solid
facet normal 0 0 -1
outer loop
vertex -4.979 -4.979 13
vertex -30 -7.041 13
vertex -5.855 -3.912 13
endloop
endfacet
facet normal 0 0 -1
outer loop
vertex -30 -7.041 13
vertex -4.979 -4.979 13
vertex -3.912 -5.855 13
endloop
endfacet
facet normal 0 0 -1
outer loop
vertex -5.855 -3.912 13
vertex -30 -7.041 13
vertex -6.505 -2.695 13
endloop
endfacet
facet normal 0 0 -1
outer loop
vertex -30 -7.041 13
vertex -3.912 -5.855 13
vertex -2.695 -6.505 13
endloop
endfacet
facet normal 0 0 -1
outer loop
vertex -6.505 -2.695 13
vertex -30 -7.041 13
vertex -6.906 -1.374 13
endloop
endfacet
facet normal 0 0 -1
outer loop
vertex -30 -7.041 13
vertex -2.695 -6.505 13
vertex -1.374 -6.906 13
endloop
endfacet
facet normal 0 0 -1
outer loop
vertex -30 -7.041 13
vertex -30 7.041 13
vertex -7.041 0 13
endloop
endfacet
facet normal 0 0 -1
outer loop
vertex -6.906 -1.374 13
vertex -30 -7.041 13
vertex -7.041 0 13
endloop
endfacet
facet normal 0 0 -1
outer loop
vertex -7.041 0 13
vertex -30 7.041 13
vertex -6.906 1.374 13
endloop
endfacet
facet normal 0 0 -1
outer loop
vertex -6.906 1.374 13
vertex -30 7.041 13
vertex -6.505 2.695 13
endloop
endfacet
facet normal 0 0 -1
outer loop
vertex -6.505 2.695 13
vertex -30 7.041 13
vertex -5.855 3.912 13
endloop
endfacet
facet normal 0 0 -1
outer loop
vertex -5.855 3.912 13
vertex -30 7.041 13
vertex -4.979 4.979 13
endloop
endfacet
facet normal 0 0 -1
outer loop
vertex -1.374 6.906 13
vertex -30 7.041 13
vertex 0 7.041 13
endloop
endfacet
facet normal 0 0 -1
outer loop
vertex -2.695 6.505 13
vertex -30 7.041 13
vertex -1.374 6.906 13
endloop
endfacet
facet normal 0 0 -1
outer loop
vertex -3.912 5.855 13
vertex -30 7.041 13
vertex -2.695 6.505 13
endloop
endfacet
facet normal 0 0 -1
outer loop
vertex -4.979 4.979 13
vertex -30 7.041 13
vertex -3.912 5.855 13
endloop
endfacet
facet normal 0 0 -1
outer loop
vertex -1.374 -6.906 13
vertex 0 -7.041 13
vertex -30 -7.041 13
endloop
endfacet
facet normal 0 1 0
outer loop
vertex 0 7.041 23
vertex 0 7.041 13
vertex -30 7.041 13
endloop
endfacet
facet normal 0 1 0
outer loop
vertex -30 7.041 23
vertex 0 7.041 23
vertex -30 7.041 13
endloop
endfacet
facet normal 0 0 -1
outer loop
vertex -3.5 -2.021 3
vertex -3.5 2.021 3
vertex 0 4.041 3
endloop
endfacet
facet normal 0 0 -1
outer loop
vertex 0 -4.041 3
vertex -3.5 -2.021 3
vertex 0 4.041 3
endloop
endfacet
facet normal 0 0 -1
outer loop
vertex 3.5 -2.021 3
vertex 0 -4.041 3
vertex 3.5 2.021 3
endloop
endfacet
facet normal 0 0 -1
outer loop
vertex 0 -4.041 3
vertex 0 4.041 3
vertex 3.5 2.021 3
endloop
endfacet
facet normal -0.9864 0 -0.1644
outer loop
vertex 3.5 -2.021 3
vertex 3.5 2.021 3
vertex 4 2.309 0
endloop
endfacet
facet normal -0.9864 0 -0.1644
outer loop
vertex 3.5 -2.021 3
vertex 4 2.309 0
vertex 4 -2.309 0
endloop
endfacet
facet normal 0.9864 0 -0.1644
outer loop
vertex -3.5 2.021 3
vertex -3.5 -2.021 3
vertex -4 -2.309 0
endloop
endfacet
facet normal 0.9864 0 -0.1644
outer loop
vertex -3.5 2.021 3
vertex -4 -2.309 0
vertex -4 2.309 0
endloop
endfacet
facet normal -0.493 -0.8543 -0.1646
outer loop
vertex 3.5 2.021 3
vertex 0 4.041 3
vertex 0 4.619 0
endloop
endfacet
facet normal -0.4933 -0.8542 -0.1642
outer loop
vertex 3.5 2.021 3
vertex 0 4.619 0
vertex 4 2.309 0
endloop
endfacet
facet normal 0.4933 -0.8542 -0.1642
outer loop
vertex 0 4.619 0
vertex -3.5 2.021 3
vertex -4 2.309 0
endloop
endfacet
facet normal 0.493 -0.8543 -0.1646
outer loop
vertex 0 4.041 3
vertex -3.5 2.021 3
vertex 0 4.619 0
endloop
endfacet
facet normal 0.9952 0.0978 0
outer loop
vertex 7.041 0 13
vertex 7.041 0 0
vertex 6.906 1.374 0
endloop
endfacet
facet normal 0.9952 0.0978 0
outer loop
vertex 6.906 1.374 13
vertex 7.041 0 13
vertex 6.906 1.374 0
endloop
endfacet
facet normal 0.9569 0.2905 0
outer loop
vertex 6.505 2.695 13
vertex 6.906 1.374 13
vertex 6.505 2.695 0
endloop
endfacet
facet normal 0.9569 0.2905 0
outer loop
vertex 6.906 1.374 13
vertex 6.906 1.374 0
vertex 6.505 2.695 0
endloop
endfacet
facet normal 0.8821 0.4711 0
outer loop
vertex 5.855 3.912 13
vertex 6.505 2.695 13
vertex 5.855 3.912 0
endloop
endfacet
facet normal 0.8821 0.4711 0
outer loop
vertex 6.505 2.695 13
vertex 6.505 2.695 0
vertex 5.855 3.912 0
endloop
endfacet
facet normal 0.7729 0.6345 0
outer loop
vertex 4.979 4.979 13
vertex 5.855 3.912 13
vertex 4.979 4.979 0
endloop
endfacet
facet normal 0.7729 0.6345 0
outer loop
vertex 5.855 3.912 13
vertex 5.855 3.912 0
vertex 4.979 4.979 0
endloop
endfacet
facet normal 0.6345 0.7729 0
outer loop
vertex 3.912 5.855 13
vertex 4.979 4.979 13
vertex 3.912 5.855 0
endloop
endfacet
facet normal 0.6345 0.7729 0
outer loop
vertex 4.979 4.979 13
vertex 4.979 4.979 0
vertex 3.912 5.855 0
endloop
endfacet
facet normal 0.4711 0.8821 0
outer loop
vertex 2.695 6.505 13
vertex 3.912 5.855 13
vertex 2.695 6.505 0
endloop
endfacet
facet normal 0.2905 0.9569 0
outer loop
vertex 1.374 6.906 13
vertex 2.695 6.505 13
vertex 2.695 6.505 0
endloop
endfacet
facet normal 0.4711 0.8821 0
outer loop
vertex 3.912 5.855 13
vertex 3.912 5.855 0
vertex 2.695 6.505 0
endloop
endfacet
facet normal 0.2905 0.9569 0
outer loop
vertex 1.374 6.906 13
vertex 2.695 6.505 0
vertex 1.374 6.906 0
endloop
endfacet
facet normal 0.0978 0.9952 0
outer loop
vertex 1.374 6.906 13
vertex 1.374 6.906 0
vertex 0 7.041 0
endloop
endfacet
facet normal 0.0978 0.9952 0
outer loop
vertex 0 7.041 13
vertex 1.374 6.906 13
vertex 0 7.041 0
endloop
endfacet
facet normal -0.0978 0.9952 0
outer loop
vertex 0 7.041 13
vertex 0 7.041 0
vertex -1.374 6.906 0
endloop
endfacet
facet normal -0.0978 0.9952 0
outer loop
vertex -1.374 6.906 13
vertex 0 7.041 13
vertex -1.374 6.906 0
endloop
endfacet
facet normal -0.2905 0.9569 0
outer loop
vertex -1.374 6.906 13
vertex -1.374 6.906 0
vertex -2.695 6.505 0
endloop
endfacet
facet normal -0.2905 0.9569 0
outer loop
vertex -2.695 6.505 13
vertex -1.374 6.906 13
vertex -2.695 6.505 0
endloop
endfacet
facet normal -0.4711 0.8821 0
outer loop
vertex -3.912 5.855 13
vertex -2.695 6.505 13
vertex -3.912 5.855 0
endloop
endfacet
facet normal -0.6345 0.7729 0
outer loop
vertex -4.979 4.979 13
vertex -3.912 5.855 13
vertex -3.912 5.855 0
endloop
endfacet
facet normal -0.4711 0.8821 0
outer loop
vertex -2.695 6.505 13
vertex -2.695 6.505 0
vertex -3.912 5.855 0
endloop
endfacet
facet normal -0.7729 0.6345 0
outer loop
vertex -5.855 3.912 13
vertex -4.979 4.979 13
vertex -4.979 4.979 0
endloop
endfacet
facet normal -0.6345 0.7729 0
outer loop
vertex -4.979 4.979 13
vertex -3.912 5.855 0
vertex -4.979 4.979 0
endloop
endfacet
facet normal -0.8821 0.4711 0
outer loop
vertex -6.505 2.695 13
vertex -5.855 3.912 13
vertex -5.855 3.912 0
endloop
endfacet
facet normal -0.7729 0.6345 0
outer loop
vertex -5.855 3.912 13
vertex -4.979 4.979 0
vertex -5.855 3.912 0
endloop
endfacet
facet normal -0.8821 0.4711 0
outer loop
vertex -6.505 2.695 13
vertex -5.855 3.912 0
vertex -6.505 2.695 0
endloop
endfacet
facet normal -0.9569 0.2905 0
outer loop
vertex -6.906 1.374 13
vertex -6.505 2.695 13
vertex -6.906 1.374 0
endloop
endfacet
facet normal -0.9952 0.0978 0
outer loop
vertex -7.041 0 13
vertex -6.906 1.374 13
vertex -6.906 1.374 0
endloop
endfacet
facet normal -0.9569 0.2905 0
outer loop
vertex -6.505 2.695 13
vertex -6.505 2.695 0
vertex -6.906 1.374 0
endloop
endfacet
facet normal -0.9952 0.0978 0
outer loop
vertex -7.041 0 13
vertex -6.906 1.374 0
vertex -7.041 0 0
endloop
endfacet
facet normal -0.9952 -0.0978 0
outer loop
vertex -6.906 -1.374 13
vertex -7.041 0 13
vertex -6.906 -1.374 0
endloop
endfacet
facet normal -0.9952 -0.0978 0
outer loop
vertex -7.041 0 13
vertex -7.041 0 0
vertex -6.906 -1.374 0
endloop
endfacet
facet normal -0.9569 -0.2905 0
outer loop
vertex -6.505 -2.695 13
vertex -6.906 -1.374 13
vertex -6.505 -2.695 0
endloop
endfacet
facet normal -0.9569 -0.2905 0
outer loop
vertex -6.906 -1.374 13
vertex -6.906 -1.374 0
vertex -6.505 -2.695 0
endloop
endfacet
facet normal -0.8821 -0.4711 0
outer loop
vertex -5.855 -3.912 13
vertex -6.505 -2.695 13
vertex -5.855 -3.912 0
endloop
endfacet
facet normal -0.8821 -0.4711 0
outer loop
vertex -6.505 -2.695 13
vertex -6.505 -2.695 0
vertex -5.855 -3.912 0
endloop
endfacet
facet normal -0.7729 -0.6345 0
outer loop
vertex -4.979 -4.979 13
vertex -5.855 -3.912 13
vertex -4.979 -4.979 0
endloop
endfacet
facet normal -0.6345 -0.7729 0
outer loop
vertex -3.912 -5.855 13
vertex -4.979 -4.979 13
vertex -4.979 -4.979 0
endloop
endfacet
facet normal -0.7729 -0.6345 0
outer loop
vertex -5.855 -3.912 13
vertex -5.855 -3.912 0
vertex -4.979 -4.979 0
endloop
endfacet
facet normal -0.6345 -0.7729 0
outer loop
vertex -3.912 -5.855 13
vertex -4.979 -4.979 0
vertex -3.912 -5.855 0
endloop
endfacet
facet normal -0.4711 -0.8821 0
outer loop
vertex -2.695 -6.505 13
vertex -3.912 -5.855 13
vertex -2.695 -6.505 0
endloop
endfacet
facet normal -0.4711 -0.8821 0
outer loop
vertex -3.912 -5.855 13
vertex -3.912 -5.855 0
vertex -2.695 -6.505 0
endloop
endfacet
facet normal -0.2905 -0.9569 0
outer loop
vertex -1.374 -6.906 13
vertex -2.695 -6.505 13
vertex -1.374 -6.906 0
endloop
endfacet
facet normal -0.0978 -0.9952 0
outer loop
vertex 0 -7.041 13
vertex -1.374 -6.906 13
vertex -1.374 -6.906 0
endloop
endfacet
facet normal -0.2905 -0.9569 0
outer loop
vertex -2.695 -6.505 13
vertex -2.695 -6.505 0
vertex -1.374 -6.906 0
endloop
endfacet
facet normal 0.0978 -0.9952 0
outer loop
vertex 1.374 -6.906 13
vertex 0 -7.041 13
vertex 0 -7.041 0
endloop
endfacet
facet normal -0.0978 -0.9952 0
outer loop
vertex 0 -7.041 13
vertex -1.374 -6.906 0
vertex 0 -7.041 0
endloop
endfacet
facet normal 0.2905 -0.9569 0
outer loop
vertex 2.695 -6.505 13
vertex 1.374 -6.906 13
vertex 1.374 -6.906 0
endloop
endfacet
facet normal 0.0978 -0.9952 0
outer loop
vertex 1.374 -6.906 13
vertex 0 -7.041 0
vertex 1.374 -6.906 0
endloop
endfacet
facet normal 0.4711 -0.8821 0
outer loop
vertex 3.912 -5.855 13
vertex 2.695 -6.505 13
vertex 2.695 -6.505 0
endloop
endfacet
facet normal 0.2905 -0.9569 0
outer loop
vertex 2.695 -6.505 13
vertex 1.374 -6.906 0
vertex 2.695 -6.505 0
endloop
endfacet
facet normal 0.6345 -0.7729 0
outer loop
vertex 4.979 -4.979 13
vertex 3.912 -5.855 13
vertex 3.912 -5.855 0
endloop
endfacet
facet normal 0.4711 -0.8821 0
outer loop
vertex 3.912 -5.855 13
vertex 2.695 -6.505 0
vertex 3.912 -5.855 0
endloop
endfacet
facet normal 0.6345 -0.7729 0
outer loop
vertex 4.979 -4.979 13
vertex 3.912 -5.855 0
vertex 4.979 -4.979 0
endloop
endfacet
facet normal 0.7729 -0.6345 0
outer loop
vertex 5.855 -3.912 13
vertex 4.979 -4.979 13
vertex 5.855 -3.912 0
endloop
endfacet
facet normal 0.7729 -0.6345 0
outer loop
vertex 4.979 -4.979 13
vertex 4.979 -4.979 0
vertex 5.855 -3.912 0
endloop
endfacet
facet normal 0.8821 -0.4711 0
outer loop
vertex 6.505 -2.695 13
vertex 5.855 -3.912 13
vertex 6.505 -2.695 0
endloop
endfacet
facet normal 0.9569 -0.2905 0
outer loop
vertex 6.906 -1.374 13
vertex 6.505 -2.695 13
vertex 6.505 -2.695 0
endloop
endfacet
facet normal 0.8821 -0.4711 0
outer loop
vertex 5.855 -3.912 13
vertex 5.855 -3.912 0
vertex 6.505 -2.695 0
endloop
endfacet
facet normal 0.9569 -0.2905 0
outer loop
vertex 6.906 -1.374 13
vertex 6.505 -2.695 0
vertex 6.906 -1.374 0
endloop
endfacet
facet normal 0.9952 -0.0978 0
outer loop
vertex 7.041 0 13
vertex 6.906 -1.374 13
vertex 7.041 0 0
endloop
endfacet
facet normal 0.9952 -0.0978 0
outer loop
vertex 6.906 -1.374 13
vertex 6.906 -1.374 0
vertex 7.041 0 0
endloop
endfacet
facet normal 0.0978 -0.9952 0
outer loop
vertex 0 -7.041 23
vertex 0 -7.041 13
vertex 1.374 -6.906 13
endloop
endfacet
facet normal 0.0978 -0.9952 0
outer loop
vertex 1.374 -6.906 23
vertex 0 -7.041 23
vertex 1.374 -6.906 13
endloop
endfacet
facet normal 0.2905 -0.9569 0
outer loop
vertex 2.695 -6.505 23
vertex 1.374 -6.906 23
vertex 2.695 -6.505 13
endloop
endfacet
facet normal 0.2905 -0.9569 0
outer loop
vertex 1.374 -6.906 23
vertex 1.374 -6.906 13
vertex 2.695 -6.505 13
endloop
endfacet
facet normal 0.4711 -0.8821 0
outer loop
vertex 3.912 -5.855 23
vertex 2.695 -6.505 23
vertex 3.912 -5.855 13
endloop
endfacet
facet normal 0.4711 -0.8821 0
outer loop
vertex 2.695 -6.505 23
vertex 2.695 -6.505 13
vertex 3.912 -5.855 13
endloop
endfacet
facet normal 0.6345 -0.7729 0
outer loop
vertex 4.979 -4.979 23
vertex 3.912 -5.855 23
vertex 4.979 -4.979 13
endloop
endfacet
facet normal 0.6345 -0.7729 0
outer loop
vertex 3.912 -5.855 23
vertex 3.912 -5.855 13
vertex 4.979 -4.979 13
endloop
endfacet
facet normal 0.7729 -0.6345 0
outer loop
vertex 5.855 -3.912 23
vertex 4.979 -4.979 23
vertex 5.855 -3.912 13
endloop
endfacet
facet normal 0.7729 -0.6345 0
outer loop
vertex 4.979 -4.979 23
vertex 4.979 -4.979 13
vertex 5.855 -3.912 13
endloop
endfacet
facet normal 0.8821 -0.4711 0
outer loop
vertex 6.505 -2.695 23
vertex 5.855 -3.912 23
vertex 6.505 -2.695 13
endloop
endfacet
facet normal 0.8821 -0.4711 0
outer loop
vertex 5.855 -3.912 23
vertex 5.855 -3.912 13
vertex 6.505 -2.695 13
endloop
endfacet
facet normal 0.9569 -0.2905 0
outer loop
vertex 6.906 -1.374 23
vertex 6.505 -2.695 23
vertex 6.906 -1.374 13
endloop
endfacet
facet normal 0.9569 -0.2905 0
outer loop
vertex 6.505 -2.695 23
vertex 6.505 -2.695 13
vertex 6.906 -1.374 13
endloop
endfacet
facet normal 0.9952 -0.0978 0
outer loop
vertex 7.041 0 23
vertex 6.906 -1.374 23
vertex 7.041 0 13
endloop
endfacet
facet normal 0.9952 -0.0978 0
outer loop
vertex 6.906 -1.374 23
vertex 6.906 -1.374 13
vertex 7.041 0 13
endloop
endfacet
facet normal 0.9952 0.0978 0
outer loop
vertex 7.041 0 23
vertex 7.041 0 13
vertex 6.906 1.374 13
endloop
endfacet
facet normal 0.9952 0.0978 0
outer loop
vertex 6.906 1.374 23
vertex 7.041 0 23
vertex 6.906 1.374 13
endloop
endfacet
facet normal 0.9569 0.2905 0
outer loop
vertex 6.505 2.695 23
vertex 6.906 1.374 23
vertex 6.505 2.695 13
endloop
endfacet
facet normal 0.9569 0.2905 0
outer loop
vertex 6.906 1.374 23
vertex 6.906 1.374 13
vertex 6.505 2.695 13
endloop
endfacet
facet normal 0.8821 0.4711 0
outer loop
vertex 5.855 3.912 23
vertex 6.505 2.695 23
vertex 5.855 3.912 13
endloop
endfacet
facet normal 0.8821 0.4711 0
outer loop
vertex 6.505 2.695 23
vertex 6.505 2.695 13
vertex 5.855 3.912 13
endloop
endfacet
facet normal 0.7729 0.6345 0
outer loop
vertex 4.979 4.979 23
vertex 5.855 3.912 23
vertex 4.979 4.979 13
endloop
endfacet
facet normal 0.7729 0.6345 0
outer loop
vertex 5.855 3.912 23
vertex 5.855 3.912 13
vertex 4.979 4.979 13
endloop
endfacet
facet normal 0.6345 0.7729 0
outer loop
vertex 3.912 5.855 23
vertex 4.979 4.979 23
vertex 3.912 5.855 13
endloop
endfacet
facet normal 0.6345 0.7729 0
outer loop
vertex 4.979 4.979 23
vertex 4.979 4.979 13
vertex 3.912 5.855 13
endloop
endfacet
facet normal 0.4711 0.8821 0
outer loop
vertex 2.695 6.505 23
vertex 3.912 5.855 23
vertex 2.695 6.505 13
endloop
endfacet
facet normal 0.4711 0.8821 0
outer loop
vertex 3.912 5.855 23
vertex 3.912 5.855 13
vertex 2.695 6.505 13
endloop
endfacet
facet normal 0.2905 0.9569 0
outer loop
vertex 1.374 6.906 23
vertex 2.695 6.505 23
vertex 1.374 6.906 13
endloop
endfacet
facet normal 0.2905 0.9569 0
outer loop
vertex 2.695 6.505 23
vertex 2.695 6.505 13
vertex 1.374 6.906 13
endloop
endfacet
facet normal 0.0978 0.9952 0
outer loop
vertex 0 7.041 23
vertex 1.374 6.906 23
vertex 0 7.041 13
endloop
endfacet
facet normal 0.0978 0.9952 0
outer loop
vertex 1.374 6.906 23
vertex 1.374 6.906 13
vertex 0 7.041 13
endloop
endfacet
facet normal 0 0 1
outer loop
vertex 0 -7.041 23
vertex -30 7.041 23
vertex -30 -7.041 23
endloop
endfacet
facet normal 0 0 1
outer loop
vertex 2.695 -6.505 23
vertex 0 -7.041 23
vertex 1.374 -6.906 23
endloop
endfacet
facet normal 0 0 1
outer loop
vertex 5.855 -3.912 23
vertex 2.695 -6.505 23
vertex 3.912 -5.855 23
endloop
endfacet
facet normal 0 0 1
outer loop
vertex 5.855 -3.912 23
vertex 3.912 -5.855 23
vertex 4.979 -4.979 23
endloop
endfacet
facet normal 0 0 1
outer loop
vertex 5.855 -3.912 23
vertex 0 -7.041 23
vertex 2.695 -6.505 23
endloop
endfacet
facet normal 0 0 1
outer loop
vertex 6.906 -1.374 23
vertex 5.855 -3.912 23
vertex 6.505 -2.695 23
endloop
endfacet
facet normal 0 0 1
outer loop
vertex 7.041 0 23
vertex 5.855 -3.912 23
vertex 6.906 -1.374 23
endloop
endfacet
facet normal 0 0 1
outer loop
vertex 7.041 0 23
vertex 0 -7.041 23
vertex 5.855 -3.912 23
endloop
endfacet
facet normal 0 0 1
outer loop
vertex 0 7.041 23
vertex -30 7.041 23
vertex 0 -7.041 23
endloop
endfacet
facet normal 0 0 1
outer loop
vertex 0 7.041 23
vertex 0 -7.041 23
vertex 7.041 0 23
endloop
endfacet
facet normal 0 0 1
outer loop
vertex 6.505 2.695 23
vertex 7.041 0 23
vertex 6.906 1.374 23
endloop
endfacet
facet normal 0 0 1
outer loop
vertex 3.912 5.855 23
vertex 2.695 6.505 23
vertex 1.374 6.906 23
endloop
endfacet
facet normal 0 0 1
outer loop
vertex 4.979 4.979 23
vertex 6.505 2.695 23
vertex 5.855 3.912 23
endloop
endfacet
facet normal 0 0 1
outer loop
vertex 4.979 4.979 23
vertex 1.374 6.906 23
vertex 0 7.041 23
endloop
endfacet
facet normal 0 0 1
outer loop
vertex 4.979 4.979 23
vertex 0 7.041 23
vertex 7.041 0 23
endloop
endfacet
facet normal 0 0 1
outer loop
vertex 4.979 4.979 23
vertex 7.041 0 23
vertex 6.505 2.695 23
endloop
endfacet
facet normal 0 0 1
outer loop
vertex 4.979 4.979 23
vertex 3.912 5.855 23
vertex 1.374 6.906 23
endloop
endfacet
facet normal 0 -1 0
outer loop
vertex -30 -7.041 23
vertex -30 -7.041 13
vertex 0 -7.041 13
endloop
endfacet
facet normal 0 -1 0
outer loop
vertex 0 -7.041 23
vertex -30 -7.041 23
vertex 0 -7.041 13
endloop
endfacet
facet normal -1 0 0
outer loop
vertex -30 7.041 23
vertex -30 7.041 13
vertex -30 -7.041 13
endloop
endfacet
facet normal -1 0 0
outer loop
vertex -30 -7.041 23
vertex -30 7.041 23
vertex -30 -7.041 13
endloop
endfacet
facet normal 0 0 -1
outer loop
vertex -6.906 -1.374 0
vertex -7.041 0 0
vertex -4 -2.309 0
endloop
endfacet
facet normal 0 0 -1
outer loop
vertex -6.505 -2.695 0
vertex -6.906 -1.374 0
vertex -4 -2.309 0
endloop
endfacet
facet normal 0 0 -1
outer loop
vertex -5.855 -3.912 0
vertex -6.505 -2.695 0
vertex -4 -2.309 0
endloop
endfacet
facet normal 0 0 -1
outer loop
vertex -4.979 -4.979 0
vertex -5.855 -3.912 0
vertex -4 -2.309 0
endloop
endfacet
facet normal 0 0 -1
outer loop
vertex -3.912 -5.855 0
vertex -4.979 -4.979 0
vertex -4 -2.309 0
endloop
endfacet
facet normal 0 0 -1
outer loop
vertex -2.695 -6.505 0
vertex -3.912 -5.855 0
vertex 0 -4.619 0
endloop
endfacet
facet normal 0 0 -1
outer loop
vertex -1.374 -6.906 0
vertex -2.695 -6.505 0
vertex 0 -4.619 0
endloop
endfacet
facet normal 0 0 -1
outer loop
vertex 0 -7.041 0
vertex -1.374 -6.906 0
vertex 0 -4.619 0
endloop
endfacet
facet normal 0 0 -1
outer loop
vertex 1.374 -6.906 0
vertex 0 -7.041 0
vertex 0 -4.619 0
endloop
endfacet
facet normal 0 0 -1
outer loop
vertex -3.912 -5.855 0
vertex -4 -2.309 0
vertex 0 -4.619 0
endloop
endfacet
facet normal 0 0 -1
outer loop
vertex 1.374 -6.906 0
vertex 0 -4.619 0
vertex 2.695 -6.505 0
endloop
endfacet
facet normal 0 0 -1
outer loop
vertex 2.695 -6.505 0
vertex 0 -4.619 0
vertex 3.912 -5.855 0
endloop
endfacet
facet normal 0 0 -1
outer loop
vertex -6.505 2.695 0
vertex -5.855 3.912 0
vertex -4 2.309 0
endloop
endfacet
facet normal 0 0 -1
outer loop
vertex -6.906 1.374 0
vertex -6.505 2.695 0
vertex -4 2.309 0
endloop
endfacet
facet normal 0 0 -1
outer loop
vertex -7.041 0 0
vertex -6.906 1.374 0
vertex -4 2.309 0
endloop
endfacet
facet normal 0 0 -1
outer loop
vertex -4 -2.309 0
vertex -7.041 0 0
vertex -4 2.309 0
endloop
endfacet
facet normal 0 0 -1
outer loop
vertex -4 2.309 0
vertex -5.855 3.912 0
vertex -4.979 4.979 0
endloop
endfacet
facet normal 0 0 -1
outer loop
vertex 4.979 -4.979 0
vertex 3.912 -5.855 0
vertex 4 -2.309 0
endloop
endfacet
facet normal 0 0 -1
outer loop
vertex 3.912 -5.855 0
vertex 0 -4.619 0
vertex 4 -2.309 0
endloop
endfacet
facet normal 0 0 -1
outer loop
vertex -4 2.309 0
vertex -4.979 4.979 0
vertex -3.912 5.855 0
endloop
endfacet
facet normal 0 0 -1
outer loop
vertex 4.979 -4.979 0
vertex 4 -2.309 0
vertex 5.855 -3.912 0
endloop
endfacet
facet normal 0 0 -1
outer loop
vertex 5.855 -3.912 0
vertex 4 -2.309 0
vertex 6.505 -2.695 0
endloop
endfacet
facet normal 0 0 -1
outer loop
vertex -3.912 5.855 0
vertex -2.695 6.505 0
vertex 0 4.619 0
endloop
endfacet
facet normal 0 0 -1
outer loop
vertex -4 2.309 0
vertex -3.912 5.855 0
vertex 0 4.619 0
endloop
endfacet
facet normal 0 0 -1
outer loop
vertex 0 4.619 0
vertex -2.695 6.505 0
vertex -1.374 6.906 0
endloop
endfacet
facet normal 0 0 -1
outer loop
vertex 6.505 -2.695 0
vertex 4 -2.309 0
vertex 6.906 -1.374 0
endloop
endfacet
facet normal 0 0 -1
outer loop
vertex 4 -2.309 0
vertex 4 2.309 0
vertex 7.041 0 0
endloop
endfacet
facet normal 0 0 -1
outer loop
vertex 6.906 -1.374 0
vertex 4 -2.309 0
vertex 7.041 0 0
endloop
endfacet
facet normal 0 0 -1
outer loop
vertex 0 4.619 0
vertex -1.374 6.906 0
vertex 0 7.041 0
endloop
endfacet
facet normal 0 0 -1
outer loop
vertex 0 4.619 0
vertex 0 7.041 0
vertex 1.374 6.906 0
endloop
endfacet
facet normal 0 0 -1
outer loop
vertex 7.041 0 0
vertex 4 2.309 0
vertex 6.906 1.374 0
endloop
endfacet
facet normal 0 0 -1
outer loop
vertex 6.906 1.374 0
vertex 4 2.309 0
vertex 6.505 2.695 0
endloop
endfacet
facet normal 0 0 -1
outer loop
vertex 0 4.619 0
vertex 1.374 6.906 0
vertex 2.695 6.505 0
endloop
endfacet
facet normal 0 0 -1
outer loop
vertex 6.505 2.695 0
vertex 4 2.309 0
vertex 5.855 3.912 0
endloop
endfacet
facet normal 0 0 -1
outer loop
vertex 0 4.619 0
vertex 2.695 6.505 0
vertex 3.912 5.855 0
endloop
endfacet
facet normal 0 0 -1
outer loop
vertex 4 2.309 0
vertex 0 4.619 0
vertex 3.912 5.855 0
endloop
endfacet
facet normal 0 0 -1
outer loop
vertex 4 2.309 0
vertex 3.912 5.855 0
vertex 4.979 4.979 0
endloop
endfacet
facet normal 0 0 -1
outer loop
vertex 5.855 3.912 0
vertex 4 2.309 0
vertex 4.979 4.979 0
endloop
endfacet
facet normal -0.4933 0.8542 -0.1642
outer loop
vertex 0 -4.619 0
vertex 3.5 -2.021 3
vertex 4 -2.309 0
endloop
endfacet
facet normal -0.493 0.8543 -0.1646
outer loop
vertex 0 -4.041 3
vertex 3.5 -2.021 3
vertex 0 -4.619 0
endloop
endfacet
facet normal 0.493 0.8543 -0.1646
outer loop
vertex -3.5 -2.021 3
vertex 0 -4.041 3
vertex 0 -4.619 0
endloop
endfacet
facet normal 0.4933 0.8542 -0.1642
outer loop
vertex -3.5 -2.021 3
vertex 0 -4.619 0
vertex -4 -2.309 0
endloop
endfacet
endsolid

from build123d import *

# Parameters (mm, degrees)
F0_R     = 7.0414518843
F1_DEPTH = 3
F2_R     = 7.0414518843
F3_DEPTH = 10
F5_DEPTH = 10
F6_SIZE2 = 2.99999
F6_SIZE  = 0.49999


# Not quite as in the source:
# - a fillet or chamfer is up to 0.001 mm smaller than in the source, because OpenCascade refuses the exact size


with BuildPart() as f1:
    # F0 (on Top) → F1 (new body)
    with BuildSketch(Plane.XY):
        Circle(F0_R)
        Polygon((0, -4.0414518843), (-3.5, -2.0207259422), (-3.5, 2.0207259422), (0, 4.0414518843), (3.5, 2.0207259422), (3.5, -2.0207259422), align=None, mode=Mode.SUBTRACT)
    extrude(amount=F1_DEPTH)

    # F2 (on face) → F3 (join)
    with BuildSketch(Plane.XY.offset(3)):
        Circle(F2_R)
        Polygon((3.5, -2.0207259422), (0, -4.0414518843), (-3.5, -2.0207259422), (-3.5, 2.0207259422), (0, 4.0414518843), (3.5, 2.0207259422), align=None, mode=Mode.SUBTRACT)
        Polygon((-3.5, -2.0207259422), (0, -4.0414518843), (3.5, -2.0207259422), (3.5, 2.0207259422), (0, 4.0414518843), (-3.5, 2.0207259422), align=None)
    extrude(amount=F3_DEPTH)

    # F4 (on face) → F5 (join)
    with BuildSketch(Plane.XY.offset(13)):
        with BuildLine():
            ThreePointArc((7.0414518843, 0), (4.9790583768, 4.9790583768), (0, 7.0414518843))
            ThreePointArc((0, 7.0414518843), (-7.0414518843, 0), (0, -7.0414518843))
            ThreePointArc((0, -7.0414518843), (4.9790583768, -4.9790583768), (7.0414518843, 0))
        make_face()
        with BuildLine():
            ThreePointArc((0, -7.0414518843), (-7.0414518843, 0), (0, 7.0414518843))
            Line((0, 7.0414518843), (-30, 7.0414518843))
            Line((-30, 7.0414518843), (-30, -7.0414518843))
            Line((-30, -7.0414518843), (0, -7.0414518843))
        make_face()
    extrude(amount=F5_DEPTH)

    # F6 (size 0.5 and 3 in the source; OpenCascade refuses exactly that, so slightly less here)
    f6_edges = [f1.edges().sort_by_distance(p)[0] for p in [
        (-1.75, -3.031089, 0),
        (-3.5, 0, 0),
        (1.75, -3.031089, 0),
        (3.5, 0, 0),
        (1.75, 3.031089, 0),
        (-1.75, 3.031089, 0),
    ]]
    f6_side = f1.faces().sort_by_distance((-6.84229, 0, 0))[0]
    chamfer(f6_edges, length=F6_SIZE, length2=F6_SIZE2, reference=f6_side)


solid = f1.part
